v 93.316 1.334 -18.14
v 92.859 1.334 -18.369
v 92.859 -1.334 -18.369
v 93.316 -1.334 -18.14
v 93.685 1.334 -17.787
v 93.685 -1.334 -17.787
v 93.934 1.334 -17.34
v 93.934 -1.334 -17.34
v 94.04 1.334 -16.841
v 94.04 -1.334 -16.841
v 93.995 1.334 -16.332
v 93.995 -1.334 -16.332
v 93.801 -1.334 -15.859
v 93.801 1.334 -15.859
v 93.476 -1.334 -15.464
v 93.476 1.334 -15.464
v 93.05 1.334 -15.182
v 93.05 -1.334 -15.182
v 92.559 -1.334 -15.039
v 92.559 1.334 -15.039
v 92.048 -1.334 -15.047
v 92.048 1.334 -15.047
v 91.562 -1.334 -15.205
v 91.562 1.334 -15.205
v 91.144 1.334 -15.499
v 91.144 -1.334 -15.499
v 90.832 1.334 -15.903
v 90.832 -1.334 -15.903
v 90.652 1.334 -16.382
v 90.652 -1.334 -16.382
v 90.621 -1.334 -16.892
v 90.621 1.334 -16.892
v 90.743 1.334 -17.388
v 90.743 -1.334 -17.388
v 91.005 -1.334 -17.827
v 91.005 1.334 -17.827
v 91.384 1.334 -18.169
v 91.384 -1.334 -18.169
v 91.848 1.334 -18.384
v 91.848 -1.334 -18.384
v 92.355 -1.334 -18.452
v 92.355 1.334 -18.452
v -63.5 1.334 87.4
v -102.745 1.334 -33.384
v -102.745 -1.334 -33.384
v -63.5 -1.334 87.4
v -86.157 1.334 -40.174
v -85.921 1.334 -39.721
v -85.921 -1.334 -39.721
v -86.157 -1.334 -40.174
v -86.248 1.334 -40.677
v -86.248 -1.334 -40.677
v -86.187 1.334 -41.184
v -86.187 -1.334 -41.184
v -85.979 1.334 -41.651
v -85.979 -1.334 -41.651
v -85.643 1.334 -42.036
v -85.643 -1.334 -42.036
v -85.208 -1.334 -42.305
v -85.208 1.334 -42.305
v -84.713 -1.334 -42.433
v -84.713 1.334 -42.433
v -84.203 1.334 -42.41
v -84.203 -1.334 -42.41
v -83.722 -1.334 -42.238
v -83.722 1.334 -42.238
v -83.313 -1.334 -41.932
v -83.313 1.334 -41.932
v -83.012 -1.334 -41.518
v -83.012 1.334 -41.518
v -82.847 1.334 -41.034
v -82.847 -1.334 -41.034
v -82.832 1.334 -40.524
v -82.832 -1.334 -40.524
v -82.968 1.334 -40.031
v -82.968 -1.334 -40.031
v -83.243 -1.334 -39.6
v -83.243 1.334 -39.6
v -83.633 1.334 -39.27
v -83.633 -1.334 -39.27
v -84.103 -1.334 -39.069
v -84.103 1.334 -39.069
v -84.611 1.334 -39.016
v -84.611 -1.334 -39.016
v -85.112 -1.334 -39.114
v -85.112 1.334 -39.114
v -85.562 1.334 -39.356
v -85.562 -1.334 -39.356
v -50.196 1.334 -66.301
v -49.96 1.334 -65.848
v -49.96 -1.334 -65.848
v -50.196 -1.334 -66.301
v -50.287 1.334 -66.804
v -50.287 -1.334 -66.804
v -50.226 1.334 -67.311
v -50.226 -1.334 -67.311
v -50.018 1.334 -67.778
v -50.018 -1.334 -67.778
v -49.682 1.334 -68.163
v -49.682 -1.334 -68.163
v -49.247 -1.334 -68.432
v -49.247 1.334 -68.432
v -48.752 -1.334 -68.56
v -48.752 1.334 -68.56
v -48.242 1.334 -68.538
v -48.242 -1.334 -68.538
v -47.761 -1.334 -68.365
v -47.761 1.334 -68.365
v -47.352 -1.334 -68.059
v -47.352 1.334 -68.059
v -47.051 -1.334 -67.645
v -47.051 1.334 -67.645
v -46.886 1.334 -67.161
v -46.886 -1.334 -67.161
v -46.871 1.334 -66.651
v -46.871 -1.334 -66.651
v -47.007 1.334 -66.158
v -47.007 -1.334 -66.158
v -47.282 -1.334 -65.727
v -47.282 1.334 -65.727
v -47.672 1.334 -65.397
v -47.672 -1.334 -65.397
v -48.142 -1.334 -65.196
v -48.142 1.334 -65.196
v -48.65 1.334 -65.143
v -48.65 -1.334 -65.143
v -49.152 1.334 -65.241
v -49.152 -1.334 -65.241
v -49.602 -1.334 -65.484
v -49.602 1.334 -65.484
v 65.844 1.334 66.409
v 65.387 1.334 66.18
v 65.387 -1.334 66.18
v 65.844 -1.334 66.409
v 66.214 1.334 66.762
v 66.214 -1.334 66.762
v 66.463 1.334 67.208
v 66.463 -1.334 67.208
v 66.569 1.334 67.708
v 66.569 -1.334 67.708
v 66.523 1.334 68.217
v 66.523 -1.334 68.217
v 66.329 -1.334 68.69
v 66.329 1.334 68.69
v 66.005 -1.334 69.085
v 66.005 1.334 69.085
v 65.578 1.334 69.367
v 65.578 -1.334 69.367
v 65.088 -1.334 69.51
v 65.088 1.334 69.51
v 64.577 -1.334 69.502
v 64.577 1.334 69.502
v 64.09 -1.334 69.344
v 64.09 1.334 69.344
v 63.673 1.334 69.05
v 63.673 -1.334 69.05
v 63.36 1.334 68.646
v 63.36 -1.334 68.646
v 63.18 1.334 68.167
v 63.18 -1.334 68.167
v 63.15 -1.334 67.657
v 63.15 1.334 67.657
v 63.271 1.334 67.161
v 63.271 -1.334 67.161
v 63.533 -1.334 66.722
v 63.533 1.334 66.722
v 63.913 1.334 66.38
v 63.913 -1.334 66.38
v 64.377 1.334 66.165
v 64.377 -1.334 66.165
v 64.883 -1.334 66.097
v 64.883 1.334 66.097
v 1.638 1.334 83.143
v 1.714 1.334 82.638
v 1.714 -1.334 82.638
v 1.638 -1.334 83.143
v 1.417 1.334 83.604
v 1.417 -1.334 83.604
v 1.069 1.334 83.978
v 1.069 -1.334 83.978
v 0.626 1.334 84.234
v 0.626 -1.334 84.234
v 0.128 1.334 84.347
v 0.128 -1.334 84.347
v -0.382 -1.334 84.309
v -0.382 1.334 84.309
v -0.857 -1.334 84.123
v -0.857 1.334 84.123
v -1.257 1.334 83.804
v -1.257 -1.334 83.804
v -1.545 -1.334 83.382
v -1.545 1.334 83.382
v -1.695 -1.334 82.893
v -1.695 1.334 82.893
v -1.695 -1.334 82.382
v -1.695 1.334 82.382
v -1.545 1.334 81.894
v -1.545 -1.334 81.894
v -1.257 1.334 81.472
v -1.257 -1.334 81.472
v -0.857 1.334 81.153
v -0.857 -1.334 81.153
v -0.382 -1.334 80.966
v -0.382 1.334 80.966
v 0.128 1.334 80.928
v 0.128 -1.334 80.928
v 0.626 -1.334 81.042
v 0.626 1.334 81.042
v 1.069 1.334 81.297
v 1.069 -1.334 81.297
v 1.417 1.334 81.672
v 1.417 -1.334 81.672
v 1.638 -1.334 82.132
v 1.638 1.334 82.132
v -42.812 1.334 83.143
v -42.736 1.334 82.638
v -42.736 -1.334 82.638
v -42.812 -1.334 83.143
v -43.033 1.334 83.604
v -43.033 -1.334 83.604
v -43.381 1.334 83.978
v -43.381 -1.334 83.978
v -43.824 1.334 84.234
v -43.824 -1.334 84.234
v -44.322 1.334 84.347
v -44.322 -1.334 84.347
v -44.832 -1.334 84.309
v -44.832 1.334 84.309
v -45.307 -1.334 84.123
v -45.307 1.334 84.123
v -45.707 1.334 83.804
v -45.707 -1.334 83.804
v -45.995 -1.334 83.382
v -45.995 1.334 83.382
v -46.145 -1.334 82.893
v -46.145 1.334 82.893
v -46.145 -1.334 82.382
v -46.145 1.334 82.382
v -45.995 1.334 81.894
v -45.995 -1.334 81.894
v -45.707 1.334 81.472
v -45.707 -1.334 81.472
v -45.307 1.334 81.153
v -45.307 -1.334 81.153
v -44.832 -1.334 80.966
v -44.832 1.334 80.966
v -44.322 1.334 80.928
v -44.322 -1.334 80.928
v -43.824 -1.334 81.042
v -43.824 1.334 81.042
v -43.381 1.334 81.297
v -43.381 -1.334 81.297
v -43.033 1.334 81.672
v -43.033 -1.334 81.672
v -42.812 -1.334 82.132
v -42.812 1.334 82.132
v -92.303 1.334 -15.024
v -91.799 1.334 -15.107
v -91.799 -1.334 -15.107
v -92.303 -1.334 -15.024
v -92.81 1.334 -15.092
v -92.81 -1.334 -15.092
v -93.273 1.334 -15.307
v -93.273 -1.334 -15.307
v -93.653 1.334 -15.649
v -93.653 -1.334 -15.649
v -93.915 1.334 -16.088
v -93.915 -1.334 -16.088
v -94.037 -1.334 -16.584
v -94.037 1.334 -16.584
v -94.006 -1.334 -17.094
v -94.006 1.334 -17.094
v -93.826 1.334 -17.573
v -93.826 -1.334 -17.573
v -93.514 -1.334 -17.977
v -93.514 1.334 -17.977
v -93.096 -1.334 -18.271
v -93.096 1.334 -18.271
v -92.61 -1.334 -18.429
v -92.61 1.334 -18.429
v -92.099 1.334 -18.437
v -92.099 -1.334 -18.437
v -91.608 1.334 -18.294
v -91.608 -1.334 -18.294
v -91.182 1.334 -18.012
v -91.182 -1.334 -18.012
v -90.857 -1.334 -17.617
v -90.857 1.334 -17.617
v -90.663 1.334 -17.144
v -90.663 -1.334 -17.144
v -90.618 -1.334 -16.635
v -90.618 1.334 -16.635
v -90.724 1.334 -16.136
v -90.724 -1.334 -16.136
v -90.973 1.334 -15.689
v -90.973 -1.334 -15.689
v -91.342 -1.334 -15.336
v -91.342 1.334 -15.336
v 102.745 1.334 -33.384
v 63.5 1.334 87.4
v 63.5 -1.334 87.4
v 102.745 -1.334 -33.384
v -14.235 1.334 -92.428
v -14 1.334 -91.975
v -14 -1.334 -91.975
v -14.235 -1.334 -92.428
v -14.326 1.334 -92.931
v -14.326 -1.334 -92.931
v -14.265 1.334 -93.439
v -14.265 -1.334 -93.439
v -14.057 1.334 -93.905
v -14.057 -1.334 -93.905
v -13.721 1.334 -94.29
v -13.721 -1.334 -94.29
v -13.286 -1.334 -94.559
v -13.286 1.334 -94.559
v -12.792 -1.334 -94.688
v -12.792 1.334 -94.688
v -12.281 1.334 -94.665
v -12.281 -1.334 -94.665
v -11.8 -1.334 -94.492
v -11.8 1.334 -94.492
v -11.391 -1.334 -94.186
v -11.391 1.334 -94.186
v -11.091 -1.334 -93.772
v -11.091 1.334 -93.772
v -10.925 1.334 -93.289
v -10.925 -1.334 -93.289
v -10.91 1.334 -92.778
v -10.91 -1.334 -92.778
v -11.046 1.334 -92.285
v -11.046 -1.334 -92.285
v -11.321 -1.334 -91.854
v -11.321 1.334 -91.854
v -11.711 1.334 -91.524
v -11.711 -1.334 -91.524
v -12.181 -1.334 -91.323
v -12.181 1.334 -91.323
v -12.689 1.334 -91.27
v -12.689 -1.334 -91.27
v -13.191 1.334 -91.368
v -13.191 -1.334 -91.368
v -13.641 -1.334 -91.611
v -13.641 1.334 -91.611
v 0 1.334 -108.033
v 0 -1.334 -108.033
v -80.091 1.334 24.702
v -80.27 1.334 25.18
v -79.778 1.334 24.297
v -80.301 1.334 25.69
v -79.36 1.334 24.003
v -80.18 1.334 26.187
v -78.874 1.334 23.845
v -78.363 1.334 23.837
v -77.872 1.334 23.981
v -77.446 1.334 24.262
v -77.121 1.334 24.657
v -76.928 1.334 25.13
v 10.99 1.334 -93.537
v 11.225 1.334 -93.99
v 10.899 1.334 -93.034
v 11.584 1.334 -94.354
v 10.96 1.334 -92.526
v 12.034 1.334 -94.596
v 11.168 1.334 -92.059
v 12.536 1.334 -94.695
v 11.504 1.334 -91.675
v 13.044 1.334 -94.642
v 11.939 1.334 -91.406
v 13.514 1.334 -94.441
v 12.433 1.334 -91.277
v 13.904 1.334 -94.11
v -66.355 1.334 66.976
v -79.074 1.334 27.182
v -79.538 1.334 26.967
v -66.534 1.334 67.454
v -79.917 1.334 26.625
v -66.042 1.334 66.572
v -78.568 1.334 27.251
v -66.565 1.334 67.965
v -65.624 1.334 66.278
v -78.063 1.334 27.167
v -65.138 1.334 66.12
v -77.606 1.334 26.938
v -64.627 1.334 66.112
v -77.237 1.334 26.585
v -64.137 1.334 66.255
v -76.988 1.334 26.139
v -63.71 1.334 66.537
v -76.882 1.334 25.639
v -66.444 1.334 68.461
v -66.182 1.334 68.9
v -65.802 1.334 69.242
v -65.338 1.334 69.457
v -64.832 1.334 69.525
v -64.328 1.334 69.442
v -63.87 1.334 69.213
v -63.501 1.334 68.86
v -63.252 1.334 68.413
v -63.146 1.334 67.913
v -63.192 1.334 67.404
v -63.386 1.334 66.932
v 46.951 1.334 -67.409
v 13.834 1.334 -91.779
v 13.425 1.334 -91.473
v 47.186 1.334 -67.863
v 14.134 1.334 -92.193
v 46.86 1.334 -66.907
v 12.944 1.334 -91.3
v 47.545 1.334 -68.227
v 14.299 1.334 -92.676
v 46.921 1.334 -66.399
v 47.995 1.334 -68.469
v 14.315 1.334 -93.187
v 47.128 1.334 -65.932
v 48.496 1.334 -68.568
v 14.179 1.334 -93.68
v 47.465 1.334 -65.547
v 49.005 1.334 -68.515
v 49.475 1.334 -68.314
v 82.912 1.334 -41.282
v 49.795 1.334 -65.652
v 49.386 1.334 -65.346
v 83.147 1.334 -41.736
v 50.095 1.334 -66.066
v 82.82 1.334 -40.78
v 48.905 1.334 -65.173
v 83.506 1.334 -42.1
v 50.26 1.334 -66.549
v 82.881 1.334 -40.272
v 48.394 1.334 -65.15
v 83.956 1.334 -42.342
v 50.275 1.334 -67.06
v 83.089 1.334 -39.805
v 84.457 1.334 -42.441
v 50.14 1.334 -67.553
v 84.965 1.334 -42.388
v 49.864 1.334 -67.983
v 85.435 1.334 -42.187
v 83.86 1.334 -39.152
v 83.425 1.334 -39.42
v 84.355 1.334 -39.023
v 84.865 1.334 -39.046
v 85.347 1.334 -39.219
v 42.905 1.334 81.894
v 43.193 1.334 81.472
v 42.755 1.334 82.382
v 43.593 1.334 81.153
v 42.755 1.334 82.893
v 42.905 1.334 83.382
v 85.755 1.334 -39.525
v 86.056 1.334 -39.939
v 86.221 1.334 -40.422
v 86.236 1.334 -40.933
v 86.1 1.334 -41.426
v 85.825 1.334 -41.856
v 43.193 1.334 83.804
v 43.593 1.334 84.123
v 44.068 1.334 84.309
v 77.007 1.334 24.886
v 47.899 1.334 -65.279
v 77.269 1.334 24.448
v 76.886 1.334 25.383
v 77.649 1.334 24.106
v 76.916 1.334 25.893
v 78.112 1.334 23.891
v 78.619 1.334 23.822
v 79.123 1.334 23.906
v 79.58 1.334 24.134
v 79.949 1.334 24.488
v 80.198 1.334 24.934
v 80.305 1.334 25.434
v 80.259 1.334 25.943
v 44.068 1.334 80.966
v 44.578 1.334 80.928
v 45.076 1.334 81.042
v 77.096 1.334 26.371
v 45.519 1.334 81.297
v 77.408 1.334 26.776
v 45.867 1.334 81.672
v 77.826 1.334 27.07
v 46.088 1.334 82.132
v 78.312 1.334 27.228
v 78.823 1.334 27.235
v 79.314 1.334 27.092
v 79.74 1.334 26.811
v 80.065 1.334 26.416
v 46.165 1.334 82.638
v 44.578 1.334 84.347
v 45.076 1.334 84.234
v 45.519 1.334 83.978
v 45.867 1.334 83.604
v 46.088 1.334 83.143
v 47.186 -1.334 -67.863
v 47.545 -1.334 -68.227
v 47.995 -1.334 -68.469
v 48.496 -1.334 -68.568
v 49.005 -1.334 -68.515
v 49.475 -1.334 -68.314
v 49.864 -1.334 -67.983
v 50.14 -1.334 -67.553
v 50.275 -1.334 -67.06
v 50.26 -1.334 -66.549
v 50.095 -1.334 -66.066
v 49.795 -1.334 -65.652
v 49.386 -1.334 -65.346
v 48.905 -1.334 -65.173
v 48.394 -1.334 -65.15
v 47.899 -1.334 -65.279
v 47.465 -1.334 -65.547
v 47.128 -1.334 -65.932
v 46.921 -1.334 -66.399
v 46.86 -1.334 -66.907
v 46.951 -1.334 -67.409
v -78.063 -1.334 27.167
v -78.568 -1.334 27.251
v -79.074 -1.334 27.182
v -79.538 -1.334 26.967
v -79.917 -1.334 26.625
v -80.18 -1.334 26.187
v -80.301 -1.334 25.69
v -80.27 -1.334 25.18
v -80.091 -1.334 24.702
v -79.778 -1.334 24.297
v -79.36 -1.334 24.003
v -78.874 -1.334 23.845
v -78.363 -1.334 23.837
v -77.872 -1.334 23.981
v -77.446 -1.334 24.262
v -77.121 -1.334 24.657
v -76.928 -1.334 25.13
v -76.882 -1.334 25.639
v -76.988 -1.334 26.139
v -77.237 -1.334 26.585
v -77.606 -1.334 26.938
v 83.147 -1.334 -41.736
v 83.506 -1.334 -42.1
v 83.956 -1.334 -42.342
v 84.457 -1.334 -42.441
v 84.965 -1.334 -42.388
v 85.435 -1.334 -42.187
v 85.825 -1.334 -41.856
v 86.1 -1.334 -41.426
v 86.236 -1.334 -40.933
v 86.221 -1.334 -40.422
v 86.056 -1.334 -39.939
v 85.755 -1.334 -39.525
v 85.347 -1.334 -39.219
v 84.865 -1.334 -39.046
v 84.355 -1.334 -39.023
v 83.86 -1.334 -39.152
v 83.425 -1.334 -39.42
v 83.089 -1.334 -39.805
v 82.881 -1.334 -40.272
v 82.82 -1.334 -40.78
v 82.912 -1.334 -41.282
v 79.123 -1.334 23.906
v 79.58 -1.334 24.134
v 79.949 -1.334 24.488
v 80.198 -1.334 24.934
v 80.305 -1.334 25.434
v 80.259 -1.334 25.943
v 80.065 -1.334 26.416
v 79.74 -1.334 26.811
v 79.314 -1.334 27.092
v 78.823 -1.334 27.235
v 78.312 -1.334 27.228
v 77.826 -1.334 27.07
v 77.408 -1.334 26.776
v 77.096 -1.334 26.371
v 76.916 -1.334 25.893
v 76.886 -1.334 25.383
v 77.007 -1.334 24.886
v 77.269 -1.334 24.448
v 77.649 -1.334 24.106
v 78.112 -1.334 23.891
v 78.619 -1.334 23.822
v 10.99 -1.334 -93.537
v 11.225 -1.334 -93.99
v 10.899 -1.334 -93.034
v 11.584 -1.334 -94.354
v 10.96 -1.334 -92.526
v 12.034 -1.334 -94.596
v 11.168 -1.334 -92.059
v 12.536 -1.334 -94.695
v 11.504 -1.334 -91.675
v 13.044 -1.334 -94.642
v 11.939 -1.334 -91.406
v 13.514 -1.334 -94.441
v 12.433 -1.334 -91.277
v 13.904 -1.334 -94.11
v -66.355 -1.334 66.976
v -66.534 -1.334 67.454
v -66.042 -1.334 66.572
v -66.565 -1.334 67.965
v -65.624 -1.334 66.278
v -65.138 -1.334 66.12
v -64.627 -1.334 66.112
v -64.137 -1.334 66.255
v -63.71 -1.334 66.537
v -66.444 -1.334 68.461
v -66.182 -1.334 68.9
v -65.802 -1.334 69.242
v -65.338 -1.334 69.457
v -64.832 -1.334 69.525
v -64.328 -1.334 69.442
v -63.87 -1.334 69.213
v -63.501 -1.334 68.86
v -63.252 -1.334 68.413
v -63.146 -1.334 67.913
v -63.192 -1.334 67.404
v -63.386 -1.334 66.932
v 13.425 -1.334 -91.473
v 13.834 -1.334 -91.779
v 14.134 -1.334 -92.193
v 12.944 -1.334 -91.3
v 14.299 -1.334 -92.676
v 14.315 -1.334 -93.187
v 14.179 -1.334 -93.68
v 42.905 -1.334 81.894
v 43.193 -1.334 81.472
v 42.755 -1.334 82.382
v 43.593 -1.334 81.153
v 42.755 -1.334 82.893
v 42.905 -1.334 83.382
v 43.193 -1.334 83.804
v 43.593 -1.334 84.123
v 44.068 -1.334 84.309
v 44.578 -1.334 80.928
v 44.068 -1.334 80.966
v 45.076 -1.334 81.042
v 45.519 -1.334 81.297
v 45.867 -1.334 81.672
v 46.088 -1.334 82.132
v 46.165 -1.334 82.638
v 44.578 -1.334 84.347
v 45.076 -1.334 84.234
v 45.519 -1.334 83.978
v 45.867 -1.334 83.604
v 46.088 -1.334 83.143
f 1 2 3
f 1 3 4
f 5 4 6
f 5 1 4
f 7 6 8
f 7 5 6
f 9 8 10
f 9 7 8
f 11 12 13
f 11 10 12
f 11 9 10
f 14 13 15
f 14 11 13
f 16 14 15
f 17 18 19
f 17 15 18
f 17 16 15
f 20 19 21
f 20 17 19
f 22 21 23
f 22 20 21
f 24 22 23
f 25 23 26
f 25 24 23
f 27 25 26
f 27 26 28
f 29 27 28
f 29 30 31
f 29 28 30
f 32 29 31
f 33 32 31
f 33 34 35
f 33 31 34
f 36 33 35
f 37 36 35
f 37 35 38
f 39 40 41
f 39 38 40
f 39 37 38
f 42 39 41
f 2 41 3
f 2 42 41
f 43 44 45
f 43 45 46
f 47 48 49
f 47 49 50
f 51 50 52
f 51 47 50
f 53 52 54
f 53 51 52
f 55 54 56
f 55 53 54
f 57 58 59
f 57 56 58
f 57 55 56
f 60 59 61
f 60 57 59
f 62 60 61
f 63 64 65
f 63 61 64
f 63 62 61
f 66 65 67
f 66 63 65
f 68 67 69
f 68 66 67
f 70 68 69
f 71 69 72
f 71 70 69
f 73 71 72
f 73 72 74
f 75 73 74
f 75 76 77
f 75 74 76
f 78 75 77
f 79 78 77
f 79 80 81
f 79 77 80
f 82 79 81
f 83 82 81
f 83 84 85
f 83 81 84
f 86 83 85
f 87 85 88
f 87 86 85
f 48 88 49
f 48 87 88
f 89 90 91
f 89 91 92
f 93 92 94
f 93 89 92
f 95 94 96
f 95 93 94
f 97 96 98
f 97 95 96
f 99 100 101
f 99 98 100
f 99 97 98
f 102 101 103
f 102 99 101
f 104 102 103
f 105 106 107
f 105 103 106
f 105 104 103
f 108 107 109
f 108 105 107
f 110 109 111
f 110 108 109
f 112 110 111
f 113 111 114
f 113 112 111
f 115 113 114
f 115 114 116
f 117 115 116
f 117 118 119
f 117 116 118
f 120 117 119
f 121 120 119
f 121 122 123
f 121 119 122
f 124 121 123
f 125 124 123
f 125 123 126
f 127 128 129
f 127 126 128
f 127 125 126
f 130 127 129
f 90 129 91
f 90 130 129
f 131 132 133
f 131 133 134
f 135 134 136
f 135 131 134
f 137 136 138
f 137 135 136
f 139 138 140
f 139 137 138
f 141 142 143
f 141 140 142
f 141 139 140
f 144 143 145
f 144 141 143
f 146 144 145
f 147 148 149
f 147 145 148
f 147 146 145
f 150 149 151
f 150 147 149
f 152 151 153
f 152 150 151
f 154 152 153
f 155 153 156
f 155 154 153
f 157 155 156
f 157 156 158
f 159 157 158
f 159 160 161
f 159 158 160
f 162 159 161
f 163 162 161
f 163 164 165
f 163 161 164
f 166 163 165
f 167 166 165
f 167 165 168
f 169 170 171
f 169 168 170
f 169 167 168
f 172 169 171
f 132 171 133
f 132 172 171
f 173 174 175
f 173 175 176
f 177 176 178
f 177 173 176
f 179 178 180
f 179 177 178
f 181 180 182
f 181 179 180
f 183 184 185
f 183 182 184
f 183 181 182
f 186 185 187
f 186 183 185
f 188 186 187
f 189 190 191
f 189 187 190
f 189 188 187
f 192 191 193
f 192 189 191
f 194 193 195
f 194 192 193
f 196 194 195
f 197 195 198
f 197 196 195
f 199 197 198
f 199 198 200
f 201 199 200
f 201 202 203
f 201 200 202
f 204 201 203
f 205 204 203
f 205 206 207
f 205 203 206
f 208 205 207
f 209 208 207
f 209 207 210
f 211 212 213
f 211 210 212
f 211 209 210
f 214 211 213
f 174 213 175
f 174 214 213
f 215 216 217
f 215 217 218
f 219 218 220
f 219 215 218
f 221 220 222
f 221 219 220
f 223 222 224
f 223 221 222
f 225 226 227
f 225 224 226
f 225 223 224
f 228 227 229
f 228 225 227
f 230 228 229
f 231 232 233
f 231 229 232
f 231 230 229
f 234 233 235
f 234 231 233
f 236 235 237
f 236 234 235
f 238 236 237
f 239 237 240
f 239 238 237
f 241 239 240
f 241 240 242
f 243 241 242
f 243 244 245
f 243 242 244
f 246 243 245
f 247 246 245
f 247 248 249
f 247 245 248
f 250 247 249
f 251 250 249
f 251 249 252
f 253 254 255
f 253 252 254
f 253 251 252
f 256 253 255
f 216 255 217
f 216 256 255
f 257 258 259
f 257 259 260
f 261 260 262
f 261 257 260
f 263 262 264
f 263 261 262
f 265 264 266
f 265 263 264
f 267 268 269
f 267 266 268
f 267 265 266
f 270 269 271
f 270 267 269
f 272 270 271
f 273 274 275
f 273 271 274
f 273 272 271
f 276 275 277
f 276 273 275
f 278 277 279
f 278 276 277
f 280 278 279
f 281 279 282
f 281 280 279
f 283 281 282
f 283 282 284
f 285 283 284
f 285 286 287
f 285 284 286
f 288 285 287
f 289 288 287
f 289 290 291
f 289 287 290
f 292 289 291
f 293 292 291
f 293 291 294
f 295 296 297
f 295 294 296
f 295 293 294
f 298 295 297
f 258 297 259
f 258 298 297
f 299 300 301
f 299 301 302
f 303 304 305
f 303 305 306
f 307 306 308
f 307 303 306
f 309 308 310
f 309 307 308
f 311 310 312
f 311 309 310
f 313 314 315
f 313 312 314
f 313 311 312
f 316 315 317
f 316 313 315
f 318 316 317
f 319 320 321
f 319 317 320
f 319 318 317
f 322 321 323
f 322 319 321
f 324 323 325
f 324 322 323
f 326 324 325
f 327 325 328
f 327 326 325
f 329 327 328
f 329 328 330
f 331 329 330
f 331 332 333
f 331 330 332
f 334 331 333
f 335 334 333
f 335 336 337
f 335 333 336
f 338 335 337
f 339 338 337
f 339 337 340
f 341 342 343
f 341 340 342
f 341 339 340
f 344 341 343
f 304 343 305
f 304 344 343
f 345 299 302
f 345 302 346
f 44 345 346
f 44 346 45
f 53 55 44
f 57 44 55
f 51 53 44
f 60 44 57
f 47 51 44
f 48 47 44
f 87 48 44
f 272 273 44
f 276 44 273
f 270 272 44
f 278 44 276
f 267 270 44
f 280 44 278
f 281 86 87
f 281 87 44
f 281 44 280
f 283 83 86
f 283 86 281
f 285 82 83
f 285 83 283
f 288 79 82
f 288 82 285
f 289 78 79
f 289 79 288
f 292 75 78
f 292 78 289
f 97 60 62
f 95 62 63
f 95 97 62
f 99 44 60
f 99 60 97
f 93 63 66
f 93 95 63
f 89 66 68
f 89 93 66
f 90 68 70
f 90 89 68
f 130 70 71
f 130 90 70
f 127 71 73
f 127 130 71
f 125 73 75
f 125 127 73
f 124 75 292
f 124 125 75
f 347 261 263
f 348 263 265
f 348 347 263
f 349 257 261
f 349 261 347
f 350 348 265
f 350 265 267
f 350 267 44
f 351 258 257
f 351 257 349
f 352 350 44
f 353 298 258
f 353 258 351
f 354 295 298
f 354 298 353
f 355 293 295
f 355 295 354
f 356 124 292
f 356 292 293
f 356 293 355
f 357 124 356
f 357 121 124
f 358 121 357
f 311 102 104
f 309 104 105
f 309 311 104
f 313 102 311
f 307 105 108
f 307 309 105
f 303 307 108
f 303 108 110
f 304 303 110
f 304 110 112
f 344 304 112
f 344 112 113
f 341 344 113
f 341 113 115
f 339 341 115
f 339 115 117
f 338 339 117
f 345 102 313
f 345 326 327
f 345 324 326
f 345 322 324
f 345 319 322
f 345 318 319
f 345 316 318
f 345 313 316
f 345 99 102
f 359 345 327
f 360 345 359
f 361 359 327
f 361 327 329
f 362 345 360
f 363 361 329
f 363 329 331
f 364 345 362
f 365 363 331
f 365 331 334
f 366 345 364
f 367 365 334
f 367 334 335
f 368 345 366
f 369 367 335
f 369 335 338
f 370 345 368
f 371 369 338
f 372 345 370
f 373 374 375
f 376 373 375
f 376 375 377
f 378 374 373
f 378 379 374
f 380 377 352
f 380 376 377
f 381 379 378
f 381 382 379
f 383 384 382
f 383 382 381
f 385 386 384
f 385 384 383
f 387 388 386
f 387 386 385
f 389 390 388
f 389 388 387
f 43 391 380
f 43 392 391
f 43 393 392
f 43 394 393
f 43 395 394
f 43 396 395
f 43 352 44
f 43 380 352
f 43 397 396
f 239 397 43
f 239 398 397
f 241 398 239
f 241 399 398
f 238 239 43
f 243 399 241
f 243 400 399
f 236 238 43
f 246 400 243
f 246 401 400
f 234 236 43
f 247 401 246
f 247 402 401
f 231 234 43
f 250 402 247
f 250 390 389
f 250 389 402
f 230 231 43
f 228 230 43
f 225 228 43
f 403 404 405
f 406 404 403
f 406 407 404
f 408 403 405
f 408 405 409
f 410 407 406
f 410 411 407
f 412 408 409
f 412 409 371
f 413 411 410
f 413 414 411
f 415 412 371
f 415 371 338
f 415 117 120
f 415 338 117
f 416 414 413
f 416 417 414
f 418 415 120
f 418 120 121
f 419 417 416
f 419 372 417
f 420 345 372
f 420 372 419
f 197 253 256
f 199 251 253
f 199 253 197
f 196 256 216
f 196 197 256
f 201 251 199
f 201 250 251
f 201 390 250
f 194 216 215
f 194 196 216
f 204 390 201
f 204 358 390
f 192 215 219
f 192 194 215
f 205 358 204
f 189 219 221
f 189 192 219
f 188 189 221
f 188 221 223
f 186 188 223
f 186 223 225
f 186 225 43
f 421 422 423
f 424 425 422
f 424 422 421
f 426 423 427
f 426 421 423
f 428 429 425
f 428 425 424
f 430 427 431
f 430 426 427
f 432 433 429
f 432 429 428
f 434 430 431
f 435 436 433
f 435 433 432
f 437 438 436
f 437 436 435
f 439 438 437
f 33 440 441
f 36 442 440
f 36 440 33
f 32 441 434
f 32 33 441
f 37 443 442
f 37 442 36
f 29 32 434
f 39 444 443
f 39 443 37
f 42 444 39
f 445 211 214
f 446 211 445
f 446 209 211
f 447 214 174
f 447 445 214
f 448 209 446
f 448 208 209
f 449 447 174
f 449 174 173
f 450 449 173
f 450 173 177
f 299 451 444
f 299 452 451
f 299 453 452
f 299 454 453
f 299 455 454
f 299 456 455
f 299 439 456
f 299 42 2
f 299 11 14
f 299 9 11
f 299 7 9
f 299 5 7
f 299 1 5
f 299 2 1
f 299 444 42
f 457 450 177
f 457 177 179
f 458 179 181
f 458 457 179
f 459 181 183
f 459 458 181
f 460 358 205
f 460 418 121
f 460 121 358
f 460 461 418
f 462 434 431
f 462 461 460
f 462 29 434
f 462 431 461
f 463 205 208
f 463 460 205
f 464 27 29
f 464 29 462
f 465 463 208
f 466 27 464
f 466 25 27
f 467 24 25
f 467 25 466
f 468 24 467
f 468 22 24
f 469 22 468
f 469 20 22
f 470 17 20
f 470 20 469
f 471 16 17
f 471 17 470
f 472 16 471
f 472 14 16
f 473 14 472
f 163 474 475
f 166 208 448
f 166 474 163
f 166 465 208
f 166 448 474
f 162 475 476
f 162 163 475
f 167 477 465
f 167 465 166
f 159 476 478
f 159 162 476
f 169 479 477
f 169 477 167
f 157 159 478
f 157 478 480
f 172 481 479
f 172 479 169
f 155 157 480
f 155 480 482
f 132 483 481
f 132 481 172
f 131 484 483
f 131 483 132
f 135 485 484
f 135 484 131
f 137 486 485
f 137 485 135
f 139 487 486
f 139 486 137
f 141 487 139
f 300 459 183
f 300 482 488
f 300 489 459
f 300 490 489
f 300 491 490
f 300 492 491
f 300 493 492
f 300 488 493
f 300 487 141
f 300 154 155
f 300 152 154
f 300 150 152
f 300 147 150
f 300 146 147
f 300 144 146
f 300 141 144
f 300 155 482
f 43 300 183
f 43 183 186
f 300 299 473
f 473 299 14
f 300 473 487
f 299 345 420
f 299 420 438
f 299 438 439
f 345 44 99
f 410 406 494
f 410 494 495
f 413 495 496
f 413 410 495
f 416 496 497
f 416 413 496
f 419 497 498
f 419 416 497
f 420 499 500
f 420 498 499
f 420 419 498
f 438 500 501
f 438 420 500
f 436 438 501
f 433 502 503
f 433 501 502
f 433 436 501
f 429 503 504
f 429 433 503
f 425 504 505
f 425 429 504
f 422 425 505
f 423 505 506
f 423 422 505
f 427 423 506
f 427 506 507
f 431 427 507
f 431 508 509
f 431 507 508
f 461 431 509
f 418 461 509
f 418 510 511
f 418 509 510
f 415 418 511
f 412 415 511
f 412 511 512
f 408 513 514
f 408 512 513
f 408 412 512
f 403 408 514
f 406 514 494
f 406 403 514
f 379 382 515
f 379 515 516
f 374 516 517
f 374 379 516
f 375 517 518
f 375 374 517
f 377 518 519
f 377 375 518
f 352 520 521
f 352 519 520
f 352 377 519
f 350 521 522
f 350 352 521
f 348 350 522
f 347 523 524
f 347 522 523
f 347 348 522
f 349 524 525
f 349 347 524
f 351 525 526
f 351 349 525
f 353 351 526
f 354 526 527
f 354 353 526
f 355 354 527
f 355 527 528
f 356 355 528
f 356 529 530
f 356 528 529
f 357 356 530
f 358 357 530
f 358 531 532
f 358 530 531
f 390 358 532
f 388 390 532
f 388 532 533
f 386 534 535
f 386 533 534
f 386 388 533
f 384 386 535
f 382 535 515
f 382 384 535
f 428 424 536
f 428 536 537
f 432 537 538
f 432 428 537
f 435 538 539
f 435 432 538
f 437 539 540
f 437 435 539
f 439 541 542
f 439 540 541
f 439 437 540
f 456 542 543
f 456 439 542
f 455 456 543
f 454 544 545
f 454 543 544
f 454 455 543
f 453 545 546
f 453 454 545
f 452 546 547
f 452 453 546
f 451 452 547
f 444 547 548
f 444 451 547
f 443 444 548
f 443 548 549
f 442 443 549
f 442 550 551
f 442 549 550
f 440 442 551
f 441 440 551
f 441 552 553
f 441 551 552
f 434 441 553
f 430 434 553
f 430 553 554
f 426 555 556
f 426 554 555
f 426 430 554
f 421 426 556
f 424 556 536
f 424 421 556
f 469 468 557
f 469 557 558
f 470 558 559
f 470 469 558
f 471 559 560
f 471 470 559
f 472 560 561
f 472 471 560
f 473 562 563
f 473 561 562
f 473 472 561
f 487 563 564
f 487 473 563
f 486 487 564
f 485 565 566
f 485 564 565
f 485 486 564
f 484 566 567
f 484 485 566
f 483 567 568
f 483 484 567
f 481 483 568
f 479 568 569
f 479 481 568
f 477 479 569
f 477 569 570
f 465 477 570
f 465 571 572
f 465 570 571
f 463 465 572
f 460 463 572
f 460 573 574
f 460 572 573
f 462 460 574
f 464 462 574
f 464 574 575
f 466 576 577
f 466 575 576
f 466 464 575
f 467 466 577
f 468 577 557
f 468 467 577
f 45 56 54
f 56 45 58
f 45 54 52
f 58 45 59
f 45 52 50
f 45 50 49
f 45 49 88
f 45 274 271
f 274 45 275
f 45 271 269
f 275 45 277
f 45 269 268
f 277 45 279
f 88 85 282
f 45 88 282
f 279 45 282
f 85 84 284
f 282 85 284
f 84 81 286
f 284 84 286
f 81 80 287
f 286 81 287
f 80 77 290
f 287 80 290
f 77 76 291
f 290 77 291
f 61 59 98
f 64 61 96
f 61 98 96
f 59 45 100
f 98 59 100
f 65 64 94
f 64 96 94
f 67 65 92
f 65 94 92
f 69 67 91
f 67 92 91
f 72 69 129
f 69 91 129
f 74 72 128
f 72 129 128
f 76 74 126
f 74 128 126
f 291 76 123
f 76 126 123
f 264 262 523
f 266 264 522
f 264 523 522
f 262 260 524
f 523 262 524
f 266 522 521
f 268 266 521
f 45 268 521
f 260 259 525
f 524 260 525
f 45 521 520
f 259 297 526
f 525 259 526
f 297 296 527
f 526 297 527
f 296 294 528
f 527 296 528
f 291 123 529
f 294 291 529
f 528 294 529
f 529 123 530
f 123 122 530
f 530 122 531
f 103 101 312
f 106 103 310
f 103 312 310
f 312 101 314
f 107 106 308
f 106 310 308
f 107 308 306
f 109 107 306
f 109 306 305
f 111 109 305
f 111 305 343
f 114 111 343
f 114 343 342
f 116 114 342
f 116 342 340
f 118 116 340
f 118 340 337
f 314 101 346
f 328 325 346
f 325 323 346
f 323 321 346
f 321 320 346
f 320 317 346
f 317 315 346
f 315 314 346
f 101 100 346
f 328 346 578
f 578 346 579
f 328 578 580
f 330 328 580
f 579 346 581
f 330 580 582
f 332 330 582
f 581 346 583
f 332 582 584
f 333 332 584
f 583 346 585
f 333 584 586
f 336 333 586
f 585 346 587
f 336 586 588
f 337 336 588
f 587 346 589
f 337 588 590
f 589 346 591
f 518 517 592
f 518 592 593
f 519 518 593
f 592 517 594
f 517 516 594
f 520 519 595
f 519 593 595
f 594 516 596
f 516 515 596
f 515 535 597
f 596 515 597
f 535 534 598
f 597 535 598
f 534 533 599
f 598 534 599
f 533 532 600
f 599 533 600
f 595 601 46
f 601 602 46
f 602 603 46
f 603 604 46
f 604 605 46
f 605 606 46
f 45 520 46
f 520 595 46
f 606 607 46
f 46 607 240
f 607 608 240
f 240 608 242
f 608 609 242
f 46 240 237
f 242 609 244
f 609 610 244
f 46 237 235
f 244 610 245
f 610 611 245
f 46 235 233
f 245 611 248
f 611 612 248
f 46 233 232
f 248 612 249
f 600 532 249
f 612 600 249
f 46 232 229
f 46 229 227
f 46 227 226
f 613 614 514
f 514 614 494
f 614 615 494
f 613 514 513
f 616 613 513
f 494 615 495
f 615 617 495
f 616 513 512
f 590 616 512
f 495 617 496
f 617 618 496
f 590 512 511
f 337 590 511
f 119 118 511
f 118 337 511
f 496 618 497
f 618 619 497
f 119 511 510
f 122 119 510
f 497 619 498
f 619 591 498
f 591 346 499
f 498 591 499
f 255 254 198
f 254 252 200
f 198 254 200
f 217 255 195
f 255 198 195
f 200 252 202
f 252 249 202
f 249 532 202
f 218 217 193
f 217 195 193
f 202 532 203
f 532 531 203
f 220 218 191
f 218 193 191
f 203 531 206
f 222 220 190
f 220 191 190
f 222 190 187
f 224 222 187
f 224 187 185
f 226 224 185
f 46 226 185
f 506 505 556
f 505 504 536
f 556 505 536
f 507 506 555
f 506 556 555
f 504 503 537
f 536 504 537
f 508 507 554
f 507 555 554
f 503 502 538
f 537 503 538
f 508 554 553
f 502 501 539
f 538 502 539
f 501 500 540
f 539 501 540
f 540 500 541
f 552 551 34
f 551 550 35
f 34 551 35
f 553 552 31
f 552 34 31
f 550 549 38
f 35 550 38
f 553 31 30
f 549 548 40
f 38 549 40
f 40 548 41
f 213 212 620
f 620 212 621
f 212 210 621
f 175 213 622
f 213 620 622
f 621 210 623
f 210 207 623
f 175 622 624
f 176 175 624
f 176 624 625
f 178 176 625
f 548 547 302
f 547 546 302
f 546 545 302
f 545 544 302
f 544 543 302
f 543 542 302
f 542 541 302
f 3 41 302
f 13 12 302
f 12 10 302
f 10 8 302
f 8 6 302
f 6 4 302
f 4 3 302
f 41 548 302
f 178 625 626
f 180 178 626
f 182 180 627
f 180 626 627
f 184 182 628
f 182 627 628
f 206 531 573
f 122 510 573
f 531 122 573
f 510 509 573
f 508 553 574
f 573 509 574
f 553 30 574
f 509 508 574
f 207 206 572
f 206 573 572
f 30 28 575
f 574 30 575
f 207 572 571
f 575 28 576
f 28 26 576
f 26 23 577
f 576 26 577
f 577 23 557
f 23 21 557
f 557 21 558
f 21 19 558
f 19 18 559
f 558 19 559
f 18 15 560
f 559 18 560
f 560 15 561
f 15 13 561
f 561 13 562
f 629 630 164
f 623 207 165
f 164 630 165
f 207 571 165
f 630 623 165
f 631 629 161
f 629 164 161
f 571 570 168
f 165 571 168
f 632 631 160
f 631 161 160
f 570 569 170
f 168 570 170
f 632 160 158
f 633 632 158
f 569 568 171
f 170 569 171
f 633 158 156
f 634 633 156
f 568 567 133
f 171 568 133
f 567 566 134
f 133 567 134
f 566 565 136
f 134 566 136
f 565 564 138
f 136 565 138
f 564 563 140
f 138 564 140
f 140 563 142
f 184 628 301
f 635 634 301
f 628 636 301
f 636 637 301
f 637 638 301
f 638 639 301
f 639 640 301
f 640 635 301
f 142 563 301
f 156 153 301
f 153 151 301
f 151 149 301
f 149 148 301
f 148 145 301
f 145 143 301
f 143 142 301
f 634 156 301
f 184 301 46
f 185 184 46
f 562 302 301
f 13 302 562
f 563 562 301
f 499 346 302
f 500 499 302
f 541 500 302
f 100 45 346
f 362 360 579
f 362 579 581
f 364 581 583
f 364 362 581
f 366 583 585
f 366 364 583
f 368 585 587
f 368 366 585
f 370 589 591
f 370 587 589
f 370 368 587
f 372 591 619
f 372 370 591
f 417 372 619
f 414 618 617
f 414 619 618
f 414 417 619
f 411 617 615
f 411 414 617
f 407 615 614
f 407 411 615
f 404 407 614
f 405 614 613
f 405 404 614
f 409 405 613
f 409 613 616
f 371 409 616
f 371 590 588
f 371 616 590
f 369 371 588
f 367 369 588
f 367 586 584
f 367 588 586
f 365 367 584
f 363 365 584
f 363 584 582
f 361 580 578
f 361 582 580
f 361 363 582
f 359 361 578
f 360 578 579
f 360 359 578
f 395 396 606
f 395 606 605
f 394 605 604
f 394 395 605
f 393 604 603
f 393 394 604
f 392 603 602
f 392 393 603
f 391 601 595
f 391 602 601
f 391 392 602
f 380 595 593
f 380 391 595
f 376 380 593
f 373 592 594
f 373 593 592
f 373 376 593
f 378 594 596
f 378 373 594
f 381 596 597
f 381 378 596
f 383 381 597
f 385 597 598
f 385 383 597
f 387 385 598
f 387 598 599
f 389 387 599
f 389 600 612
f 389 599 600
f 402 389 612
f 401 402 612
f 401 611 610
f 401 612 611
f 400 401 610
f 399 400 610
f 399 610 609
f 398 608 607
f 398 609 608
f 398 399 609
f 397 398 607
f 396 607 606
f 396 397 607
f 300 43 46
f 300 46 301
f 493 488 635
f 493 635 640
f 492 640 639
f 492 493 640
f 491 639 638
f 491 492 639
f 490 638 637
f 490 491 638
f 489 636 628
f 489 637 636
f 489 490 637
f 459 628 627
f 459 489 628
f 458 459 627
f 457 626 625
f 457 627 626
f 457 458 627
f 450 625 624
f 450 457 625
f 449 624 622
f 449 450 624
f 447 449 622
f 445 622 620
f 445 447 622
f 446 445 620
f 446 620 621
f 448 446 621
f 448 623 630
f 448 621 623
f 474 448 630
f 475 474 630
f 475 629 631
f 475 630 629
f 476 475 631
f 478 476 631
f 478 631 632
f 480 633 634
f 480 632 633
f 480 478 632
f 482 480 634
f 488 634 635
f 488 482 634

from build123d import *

# Parameters (mm, degrees)
BOSS_EXTRUDE1_DEPTH = 1.3335
CUT_EXTRUDE1_START  = -3.667
SKETCH2_R           = 1.7145
CUT_EXTRUDE1_DEPTH  = 4.667
CIRPATTERN1_COUNT   = 5


with BuildPart() as part:
    # Sketch1 → Boss-Extrude1 (new body, symmetric)
    with BuildSketch(Plane(origin=(0, 0, 0), x_dir=(1, 0, 0), z_dir=(0, 1, 0))):
        Polygon((0, 0), (-63.5, -87.40025195), (0, -87.40025195), (63.5, -87.40025195), align=None)
    boss_extrude1 = extrude(amount=BOSS_EXTRUDE1_DEPTH, both=True)

    # Sketch2 → Cut-Extrude1 (cut)
    with BuildSketch(Plane.XZ.offset(1.3335).offset(CUT_EXTRUDE1_START)):
        with Locations((-44.45, 82.63775195)):
            Circle(SKETCH2_R)
        with Locations((0, 82.63775195)):
            Circle(SKETCH2_R)
        with Locations((44.45, 82.63775195)):
            Circle(SKETCH2_R)
    cut_extrude1 = extrude(amount=CUT_EXTRUDE1_DEPTH, mode=Mode.SUBTRACT)

    # CirPattern1: Boss-Extrude1, Cut-Extrude1 ×5 about axis
    cirpattern1_axis = Axis((0, 0, 0), (0, 1, 0))
    for i in range(1, CIRPATTERN1_COUNT):
        add(boss_extrude1.rotate(cirpattern1_axis, i * 360 / CIRPATTERN1_COUNT))
        add(cut_extrude1.rotate(cirpattern1_axis, i * 360 / CIRPATTERN1_COUNT), mode=Mode.SUBTRACT)


solid = part.part
